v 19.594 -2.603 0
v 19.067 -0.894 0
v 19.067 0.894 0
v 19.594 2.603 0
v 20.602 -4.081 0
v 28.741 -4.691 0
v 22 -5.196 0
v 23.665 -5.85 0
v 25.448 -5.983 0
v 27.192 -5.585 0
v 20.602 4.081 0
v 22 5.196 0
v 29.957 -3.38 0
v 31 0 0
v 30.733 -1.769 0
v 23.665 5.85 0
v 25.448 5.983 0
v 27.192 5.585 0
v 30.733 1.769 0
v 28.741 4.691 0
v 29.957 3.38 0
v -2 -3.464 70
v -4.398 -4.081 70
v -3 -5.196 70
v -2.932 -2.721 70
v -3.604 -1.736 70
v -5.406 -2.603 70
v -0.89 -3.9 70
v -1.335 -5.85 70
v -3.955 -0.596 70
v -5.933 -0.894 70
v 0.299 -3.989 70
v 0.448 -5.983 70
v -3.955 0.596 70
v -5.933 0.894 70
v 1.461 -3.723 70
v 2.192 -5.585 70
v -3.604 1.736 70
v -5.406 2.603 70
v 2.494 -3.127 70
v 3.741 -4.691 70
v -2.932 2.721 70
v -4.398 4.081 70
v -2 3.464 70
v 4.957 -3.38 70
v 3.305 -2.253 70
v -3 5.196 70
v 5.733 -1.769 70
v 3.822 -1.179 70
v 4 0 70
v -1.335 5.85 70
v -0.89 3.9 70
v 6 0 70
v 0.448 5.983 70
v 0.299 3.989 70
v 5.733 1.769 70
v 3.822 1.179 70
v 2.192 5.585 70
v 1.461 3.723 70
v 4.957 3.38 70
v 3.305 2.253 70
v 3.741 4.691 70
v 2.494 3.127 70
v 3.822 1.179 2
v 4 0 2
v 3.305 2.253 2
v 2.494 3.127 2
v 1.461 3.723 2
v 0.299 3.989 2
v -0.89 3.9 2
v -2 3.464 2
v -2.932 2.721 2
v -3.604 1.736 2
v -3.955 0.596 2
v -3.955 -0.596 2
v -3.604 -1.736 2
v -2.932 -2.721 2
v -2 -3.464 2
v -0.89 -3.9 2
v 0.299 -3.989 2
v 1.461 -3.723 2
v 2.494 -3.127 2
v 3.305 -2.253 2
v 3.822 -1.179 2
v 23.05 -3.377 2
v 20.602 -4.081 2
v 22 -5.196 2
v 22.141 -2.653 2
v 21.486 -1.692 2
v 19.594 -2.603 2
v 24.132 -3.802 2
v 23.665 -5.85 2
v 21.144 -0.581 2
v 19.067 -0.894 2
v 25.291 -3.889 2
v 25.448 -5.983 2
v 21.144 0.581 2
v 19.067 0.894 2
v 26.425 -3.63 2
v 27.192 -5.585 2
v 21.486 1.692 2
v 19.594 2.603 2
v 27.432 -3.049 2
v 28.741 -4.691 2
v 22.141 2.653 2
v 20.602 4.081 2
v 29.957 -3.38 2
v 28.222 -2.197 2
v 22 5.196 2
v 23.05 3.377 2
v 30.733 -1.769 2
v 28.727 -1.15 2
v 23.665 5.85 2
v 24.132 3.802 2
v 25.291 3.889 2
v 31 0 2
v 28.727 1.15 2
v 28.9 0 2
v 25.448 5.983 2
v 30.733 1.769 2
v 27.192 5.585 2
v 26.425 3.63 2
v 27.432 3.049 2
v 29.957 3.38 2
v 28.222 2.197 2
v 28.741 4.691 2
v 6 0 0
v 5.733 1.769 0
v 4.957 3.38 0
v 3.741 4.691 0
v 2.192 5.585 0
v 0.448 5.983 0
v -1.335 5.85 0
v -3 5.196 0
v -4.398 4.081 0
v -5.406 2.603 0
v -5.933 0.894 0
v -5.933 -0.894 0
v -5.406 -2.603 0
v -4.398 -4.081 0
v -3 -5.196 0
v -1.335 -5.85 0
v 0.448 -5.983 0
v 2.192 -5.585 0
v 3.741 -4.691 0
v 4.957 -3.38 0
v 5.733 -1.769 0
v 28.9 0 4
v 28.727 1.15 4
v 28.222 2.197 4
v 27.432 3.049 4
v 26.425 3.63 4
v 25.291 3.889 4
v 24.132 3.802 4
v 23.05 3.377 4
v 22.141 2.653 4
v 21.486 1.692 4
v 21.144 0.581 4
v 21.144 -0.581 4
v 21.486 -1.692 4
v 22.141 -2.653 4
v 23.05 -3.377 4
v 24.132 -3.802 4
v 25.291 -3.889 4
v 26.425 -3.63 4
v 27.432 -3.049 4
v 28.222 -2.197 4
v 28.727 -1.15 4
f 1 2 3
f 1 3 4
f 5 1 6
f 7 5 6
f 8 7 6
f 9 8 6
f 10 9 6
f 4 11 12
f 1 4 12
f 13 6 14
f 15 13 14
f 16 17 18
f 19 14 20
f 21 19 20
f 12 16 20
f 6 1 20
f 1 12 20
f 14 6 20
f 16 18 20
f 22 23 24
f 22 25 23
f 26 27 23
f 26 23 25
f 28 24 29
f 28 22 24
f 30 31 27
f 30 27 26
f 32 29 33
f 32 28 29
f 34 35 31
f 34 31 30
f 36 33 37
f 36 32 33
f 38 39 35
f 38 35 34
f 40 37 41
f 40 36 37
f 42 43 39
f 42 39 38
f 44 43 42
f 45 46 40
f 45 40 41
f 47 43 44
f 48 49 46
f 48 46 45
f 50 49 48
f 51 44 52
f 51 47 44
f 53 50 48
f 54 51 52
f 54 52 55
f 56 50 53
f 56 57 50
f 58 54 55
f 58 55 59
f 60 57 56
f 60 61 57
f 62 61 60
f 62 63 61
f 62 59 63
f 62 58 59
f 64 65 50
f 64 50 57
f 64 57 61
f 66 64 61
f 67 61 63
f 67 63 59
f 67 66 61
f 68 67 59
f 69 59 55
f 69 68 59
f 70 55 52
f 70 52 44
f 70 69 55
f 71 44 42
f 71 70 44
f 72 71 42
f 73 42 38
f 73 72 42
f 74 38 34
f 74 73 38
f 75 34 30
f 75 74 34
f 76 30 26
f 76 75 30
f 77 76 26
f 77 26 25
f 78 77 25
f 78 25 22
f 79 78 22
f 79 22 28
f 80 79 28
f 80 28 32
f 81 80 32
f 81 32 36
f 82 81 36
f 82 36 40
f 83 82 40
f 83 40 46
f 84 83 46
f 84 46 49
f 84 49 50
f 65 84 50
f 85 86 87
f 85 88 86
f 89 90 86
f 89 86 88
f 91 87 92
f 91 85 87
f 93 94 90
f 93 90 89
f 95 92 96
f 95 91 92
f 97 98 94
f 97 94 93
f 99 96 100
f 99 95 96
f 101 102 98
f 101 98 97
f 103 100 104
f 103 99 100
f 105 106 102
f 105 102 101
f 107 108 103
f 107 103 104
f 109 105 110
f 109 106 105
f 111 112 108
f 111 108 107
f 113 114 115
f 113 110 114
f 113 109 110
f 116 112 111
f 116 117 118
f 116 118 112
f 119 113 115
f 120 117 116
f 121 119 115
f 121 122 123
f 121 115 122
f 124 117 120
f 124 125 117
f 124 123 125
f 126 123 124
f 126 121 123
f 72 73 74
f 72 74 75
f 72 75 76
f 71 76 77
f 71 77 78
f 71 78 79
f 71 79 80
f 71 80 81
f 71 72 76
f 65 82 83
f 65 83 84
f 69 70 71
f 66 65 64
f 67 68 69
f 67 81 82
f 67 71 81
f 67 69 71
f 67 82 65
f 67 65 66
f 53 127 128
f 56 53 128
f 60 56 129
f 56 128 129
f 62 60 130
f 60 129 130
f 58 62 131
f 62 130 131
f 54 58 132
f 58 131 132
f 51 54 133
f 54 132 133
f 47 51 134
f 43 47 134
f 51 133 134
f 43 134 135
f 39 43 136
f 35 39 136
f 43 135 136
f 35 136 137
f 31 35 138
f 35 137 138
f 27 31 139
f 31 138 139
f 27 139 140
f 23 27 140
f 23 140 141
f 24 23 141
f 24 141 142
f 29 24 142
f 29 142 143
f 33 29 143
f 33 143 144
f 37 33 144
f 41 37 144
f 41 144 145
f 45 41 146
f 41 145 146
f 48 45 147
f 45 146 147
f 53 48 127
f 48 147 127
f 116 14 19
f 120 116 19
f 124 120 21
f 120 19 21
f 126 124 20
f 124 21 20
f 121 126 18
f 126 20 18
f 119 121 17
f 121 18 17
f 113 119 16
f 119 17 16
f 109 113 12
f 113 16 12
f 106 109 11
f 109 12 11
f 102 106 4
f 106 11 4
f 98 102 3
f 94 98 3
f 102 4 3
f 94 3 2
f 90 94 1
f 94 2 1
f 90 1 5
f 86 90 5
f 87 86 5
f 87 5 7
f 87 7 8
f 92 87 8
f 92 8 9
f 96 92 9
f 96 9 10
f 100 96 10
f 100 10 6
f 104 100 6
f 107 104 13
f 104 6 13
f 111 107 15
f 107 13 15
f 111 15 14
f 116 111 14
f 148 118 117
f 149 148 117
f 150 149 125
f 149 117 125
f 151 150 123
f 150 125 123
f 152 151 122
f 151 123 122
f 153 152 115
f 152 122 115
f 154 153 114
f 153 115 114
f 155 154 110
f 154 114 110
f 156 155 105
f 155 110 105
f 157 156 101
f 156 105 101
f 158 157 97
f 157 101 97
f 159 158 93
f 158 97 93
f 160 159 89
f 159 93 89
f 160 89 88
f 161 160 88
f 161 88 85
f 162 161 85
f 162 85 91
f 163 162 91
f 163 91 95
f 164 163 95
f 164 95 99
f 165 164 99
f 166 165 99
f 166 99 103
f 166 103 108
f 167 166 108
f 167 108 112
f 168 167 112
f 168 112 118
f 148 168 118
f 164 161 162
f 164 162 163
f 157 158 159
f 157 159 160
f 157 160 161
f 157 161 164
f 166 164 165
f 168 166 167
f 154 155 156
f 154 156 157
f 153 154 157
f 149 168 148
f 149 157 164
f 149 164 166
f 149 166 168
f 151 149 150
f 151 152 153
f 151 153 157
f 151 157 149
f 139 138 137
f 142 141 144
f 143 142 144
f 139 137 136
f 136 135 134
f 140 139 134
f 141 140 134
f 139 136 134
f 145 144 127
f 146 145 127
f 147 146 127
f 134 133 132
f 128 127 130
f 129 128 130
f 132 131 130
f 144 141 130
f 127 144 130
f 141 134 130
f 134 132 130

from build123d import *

# Parameters (mm, degrees)
F0_R     = 6
F0_R_2   = 4
F1_DEPTH = 70
F2_DEPTH = 2
F0_R_3   = 3.9
F3_DEPTH = 2
F4_DEPTH = 4


with BuildPart() as f1:
    # F0 (on Top) → F1 (new body)
    with BuildSketch(Plane.XY):
        Circle(F0_R)
        Circle(F0_R_2, mode=Mode.SUBTRACT)
    extrude(amount=F1_DEPTH)

    # F0 (on Top) → F2 (join)
    with BuildSketch(Plane.XY):
        Circle(F0_R_2)
    extrude(amount=F2_DEPTH)


with BuildPart() as f3:
    # F0 (on Top) → F3 (new body)
    with BuildSketch(Plane.XY):
        with Locations((25, 0)):
            Circle(F0_R)
        with Locations((25, 0)):
            Circle(F0_R_3, mode=Mode.SUBTRACT)
    extrude(amount=F3_DEPTH)

    # F0 (on Top) → F4 (join)
    with BuildSketch(Plane.XY):
        with Locations((25, 0)):
            Circle(F0_R_3)
    extrude(amount=F4_DEPTH)


solid = Compound([f1.part, f3.part])
